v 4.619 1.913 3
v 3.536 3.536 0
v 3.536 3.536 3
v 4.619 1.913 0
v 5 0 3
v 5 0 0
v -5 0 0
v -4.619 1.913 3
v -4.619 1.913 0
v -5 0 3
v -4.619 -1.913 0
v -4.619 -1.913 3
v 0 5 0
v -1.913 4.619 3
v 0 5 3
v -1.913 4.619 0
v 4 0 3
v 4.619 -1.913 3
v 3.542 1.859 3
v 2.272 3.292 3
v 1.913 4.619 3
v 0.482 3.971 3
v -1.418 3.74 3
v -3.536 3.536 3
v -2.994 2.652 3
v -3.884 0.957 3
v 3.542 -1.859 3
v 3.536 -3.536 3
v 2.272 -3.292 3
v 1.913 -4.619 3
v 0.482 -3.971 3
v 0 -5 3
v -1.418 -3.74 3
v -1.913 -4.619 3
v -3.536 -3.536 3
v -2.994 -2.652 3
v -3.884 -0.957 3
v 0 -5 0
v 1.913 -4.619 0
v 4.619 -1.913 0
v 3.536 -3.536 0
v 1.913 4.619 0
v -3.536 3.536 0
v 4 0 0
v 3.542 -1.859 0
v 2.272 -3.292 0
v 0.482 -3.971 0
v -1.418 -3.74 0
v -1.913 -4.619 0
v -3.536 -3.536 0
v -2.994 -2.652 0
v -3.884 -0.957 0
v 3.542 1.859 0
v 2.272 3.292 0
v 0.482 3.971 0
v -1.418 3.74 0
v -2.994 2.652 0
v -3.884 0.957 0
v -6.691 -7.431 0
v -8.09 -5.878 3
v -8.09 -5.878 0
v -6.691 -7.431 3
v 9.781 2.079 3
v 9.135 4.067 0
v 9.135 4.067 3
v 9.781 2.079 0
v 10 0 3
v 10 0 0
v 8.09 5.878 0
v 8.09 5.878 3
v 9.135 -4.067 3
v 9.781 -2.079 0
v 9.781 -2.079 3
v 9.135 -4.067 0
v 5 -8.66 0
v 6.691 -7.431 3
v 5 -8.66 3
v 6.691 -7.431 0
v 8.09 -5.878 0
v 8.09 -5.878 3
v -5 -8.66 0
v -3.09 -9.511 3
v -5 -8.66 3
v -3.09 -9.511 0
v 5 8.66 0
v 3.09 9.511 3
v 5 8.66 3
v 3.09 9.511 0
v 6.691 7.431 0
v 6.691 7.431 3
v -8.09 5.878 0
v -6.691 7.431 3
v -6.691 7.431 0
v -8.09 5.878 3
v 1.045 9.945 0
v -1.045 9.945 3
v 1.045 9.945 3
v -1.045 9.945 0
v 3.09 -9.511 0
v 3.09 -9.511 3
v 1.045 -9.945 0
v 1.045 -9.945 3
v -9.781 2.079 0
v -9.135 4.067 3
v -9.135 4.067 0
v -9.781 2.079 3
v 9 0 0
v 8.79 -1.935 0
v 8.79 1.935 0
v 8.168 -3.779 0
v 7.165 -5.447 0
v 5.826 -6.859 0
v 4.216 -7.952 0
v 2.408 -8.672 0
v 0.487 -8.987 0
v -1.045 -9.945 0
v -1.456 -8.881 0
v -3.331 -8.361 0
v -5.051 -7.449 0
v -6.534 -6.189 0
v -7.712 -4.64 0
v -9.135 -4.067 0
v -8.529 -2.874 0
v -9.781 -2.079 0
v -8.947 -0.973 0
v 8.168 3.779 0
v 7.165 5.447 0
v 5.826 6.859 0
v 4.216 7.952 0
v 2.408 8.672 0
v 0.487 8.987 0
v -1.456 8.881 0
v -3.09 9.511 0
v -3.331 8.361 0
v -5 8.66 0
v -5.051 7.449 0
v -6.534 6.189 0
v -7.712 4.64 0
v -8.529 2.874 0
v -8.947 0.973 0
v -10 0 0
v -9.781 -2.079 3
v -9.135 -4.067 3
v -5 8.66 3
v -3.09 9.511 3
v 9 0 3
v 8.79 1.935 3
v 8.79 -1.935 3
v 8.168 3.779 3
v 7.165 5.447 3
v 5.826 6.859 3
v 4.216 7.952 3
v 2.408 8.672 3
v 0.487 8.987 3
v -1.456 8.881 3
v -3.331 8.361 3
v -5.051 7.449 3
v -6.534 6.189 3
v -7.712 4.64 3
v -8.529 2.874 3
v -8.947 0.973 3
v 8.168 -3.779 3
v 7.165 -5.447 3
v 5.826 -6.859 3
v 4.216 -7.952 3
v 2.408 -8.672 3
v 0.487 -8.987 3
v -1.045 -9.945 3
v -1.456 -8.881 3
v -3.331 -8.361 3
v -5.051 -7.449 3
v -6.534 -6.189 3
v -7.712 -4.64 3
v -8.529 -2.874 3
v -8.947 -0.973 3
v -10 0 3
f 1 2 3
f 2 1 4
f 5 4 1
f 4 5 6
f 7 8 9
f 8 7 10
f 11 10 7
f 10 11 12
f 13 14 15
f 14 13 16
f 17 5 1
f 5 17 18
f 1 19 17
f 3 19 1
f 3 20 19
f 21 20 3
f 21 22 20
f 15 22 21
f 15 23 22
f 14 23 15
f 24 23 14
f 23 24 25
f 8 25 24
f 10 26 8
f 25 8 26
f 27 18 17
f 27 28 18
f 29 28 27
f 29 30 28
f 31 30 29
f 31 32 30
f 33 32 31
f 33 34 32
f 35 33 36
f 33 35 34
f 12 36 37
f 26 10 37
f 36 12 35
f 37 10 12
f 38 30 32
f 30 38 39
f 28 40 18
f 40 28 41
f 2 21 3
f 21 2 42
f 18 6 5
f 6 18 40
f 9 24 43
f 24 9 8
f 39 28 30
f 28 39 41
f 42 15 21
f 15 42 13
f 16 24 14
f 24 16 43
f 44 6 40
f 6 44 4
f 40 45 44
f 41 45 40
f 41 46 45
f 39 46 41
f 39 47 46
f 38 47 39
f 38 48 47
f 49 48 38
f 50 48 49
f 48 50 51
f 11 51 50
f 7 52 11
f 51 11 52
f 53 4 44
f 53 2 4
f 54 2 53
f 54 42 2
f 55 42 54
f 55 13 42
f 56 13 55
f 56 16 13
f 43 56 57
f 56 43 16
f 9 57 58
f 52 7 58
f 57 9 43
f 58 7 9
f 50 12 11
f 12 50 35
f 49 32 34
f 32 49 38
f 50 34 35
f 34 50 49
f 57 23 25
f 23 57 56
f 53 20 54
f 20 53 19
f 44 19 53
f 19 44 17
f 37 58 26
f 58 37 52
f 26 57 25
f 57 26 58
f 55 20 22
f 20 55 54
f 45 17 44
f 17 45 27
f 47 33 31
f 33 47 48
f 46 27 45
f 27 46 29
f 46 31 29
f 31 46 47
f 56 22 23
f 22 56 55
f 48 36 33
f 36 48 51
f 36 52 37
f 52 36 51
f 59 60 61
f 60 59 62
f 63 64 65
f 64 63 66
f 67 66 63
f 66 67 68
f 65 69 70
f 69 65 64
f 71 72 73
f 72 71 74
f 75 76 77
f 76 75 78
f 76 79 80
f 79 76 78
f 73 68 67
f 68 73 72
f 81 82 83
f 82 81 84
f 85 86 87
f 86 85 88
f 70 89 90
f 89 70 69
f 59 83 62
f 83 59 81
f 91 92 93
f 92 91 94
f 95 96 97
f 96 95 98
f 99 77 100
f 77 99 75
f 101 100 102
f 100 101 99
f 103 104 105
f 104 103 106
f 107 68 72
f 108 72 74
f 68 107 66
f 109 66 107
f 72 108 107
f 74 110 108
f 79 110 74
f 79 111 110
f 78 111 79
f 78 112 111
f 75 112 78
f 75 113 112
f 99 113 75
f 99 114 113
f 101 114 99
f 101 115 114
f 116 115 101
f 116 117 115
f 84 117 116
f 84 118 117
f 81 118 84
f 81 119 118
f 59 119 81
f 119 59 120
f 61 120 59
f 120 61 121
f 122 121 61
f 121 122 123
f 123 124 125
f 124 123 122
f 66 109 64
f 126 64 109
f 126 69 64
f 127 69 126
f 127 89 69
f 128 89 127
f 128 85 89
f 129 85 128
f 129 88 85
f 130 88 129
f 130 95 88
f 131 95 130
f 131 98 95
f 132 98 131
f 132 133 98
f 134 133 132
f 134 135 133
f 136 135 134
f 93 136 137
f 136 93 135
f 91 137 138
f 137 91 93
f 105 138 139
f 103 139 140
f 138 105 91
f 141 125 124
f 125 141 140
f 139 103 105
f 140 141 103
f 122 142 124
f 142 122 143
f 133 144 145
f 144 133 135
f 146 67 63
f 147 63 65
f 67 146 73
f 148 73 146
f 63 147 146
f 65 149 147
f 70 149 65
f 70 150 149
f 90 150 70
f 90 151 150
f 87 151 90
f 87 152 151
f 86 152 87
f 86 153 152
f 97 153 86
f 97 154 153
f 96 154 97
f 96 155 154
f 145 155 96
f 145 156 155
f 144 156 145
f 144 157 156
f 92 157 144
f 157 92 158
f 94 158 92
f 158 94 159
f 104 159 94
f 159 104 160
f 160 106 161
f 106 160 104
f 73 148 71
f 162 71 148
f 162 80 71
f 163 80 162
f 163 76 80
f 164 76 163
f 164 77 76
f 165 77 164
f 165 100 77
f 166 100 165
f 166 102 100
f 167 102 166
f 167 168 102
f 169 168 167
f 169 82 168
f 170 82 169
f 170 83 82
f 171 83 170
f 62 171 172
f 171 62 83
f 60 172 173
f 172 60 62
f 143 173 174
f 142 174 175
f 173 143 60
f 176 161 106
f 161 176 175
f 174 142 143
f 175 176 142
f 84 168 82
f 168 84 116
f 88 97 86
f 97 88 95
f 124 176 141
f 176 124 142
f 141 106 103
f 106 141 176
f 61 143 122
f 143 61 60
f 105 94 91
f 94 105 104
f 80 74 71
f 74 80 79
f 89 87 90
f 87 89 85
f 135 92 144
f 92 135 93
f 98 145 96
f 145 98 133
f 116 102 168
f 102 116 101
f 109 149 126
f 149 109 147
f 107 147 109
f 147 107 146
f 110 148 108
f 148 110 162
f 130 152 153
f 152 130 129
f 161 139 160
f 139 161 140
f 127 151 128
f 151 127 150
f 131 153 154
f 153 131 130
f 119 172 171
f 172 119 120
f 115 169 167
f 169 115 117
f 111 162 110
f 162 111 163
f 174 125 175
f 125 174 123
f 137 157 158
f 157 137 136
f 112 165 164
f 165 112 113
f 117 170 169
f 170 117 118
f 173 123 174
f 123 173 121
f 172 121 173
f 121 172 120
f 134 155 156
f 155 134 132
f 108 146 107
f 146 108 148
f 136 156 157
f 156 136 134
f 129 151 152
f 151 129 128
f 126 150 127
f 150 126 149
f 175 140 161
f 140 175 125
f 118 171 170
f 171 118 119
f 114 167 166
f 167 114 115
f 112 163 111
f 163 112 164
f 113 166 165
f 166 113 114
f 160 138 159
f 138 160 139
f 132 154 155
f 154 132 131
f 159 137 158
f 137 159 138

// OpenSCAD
union() {
	difference() {
		cylinder(d = 10, h = 3);
		cylinder(d = 8, h = 3);
	}
	difference() {
		cylinder(d = 20, h = 3);
		cylinder(d = 18, h = 3);
	}
}
